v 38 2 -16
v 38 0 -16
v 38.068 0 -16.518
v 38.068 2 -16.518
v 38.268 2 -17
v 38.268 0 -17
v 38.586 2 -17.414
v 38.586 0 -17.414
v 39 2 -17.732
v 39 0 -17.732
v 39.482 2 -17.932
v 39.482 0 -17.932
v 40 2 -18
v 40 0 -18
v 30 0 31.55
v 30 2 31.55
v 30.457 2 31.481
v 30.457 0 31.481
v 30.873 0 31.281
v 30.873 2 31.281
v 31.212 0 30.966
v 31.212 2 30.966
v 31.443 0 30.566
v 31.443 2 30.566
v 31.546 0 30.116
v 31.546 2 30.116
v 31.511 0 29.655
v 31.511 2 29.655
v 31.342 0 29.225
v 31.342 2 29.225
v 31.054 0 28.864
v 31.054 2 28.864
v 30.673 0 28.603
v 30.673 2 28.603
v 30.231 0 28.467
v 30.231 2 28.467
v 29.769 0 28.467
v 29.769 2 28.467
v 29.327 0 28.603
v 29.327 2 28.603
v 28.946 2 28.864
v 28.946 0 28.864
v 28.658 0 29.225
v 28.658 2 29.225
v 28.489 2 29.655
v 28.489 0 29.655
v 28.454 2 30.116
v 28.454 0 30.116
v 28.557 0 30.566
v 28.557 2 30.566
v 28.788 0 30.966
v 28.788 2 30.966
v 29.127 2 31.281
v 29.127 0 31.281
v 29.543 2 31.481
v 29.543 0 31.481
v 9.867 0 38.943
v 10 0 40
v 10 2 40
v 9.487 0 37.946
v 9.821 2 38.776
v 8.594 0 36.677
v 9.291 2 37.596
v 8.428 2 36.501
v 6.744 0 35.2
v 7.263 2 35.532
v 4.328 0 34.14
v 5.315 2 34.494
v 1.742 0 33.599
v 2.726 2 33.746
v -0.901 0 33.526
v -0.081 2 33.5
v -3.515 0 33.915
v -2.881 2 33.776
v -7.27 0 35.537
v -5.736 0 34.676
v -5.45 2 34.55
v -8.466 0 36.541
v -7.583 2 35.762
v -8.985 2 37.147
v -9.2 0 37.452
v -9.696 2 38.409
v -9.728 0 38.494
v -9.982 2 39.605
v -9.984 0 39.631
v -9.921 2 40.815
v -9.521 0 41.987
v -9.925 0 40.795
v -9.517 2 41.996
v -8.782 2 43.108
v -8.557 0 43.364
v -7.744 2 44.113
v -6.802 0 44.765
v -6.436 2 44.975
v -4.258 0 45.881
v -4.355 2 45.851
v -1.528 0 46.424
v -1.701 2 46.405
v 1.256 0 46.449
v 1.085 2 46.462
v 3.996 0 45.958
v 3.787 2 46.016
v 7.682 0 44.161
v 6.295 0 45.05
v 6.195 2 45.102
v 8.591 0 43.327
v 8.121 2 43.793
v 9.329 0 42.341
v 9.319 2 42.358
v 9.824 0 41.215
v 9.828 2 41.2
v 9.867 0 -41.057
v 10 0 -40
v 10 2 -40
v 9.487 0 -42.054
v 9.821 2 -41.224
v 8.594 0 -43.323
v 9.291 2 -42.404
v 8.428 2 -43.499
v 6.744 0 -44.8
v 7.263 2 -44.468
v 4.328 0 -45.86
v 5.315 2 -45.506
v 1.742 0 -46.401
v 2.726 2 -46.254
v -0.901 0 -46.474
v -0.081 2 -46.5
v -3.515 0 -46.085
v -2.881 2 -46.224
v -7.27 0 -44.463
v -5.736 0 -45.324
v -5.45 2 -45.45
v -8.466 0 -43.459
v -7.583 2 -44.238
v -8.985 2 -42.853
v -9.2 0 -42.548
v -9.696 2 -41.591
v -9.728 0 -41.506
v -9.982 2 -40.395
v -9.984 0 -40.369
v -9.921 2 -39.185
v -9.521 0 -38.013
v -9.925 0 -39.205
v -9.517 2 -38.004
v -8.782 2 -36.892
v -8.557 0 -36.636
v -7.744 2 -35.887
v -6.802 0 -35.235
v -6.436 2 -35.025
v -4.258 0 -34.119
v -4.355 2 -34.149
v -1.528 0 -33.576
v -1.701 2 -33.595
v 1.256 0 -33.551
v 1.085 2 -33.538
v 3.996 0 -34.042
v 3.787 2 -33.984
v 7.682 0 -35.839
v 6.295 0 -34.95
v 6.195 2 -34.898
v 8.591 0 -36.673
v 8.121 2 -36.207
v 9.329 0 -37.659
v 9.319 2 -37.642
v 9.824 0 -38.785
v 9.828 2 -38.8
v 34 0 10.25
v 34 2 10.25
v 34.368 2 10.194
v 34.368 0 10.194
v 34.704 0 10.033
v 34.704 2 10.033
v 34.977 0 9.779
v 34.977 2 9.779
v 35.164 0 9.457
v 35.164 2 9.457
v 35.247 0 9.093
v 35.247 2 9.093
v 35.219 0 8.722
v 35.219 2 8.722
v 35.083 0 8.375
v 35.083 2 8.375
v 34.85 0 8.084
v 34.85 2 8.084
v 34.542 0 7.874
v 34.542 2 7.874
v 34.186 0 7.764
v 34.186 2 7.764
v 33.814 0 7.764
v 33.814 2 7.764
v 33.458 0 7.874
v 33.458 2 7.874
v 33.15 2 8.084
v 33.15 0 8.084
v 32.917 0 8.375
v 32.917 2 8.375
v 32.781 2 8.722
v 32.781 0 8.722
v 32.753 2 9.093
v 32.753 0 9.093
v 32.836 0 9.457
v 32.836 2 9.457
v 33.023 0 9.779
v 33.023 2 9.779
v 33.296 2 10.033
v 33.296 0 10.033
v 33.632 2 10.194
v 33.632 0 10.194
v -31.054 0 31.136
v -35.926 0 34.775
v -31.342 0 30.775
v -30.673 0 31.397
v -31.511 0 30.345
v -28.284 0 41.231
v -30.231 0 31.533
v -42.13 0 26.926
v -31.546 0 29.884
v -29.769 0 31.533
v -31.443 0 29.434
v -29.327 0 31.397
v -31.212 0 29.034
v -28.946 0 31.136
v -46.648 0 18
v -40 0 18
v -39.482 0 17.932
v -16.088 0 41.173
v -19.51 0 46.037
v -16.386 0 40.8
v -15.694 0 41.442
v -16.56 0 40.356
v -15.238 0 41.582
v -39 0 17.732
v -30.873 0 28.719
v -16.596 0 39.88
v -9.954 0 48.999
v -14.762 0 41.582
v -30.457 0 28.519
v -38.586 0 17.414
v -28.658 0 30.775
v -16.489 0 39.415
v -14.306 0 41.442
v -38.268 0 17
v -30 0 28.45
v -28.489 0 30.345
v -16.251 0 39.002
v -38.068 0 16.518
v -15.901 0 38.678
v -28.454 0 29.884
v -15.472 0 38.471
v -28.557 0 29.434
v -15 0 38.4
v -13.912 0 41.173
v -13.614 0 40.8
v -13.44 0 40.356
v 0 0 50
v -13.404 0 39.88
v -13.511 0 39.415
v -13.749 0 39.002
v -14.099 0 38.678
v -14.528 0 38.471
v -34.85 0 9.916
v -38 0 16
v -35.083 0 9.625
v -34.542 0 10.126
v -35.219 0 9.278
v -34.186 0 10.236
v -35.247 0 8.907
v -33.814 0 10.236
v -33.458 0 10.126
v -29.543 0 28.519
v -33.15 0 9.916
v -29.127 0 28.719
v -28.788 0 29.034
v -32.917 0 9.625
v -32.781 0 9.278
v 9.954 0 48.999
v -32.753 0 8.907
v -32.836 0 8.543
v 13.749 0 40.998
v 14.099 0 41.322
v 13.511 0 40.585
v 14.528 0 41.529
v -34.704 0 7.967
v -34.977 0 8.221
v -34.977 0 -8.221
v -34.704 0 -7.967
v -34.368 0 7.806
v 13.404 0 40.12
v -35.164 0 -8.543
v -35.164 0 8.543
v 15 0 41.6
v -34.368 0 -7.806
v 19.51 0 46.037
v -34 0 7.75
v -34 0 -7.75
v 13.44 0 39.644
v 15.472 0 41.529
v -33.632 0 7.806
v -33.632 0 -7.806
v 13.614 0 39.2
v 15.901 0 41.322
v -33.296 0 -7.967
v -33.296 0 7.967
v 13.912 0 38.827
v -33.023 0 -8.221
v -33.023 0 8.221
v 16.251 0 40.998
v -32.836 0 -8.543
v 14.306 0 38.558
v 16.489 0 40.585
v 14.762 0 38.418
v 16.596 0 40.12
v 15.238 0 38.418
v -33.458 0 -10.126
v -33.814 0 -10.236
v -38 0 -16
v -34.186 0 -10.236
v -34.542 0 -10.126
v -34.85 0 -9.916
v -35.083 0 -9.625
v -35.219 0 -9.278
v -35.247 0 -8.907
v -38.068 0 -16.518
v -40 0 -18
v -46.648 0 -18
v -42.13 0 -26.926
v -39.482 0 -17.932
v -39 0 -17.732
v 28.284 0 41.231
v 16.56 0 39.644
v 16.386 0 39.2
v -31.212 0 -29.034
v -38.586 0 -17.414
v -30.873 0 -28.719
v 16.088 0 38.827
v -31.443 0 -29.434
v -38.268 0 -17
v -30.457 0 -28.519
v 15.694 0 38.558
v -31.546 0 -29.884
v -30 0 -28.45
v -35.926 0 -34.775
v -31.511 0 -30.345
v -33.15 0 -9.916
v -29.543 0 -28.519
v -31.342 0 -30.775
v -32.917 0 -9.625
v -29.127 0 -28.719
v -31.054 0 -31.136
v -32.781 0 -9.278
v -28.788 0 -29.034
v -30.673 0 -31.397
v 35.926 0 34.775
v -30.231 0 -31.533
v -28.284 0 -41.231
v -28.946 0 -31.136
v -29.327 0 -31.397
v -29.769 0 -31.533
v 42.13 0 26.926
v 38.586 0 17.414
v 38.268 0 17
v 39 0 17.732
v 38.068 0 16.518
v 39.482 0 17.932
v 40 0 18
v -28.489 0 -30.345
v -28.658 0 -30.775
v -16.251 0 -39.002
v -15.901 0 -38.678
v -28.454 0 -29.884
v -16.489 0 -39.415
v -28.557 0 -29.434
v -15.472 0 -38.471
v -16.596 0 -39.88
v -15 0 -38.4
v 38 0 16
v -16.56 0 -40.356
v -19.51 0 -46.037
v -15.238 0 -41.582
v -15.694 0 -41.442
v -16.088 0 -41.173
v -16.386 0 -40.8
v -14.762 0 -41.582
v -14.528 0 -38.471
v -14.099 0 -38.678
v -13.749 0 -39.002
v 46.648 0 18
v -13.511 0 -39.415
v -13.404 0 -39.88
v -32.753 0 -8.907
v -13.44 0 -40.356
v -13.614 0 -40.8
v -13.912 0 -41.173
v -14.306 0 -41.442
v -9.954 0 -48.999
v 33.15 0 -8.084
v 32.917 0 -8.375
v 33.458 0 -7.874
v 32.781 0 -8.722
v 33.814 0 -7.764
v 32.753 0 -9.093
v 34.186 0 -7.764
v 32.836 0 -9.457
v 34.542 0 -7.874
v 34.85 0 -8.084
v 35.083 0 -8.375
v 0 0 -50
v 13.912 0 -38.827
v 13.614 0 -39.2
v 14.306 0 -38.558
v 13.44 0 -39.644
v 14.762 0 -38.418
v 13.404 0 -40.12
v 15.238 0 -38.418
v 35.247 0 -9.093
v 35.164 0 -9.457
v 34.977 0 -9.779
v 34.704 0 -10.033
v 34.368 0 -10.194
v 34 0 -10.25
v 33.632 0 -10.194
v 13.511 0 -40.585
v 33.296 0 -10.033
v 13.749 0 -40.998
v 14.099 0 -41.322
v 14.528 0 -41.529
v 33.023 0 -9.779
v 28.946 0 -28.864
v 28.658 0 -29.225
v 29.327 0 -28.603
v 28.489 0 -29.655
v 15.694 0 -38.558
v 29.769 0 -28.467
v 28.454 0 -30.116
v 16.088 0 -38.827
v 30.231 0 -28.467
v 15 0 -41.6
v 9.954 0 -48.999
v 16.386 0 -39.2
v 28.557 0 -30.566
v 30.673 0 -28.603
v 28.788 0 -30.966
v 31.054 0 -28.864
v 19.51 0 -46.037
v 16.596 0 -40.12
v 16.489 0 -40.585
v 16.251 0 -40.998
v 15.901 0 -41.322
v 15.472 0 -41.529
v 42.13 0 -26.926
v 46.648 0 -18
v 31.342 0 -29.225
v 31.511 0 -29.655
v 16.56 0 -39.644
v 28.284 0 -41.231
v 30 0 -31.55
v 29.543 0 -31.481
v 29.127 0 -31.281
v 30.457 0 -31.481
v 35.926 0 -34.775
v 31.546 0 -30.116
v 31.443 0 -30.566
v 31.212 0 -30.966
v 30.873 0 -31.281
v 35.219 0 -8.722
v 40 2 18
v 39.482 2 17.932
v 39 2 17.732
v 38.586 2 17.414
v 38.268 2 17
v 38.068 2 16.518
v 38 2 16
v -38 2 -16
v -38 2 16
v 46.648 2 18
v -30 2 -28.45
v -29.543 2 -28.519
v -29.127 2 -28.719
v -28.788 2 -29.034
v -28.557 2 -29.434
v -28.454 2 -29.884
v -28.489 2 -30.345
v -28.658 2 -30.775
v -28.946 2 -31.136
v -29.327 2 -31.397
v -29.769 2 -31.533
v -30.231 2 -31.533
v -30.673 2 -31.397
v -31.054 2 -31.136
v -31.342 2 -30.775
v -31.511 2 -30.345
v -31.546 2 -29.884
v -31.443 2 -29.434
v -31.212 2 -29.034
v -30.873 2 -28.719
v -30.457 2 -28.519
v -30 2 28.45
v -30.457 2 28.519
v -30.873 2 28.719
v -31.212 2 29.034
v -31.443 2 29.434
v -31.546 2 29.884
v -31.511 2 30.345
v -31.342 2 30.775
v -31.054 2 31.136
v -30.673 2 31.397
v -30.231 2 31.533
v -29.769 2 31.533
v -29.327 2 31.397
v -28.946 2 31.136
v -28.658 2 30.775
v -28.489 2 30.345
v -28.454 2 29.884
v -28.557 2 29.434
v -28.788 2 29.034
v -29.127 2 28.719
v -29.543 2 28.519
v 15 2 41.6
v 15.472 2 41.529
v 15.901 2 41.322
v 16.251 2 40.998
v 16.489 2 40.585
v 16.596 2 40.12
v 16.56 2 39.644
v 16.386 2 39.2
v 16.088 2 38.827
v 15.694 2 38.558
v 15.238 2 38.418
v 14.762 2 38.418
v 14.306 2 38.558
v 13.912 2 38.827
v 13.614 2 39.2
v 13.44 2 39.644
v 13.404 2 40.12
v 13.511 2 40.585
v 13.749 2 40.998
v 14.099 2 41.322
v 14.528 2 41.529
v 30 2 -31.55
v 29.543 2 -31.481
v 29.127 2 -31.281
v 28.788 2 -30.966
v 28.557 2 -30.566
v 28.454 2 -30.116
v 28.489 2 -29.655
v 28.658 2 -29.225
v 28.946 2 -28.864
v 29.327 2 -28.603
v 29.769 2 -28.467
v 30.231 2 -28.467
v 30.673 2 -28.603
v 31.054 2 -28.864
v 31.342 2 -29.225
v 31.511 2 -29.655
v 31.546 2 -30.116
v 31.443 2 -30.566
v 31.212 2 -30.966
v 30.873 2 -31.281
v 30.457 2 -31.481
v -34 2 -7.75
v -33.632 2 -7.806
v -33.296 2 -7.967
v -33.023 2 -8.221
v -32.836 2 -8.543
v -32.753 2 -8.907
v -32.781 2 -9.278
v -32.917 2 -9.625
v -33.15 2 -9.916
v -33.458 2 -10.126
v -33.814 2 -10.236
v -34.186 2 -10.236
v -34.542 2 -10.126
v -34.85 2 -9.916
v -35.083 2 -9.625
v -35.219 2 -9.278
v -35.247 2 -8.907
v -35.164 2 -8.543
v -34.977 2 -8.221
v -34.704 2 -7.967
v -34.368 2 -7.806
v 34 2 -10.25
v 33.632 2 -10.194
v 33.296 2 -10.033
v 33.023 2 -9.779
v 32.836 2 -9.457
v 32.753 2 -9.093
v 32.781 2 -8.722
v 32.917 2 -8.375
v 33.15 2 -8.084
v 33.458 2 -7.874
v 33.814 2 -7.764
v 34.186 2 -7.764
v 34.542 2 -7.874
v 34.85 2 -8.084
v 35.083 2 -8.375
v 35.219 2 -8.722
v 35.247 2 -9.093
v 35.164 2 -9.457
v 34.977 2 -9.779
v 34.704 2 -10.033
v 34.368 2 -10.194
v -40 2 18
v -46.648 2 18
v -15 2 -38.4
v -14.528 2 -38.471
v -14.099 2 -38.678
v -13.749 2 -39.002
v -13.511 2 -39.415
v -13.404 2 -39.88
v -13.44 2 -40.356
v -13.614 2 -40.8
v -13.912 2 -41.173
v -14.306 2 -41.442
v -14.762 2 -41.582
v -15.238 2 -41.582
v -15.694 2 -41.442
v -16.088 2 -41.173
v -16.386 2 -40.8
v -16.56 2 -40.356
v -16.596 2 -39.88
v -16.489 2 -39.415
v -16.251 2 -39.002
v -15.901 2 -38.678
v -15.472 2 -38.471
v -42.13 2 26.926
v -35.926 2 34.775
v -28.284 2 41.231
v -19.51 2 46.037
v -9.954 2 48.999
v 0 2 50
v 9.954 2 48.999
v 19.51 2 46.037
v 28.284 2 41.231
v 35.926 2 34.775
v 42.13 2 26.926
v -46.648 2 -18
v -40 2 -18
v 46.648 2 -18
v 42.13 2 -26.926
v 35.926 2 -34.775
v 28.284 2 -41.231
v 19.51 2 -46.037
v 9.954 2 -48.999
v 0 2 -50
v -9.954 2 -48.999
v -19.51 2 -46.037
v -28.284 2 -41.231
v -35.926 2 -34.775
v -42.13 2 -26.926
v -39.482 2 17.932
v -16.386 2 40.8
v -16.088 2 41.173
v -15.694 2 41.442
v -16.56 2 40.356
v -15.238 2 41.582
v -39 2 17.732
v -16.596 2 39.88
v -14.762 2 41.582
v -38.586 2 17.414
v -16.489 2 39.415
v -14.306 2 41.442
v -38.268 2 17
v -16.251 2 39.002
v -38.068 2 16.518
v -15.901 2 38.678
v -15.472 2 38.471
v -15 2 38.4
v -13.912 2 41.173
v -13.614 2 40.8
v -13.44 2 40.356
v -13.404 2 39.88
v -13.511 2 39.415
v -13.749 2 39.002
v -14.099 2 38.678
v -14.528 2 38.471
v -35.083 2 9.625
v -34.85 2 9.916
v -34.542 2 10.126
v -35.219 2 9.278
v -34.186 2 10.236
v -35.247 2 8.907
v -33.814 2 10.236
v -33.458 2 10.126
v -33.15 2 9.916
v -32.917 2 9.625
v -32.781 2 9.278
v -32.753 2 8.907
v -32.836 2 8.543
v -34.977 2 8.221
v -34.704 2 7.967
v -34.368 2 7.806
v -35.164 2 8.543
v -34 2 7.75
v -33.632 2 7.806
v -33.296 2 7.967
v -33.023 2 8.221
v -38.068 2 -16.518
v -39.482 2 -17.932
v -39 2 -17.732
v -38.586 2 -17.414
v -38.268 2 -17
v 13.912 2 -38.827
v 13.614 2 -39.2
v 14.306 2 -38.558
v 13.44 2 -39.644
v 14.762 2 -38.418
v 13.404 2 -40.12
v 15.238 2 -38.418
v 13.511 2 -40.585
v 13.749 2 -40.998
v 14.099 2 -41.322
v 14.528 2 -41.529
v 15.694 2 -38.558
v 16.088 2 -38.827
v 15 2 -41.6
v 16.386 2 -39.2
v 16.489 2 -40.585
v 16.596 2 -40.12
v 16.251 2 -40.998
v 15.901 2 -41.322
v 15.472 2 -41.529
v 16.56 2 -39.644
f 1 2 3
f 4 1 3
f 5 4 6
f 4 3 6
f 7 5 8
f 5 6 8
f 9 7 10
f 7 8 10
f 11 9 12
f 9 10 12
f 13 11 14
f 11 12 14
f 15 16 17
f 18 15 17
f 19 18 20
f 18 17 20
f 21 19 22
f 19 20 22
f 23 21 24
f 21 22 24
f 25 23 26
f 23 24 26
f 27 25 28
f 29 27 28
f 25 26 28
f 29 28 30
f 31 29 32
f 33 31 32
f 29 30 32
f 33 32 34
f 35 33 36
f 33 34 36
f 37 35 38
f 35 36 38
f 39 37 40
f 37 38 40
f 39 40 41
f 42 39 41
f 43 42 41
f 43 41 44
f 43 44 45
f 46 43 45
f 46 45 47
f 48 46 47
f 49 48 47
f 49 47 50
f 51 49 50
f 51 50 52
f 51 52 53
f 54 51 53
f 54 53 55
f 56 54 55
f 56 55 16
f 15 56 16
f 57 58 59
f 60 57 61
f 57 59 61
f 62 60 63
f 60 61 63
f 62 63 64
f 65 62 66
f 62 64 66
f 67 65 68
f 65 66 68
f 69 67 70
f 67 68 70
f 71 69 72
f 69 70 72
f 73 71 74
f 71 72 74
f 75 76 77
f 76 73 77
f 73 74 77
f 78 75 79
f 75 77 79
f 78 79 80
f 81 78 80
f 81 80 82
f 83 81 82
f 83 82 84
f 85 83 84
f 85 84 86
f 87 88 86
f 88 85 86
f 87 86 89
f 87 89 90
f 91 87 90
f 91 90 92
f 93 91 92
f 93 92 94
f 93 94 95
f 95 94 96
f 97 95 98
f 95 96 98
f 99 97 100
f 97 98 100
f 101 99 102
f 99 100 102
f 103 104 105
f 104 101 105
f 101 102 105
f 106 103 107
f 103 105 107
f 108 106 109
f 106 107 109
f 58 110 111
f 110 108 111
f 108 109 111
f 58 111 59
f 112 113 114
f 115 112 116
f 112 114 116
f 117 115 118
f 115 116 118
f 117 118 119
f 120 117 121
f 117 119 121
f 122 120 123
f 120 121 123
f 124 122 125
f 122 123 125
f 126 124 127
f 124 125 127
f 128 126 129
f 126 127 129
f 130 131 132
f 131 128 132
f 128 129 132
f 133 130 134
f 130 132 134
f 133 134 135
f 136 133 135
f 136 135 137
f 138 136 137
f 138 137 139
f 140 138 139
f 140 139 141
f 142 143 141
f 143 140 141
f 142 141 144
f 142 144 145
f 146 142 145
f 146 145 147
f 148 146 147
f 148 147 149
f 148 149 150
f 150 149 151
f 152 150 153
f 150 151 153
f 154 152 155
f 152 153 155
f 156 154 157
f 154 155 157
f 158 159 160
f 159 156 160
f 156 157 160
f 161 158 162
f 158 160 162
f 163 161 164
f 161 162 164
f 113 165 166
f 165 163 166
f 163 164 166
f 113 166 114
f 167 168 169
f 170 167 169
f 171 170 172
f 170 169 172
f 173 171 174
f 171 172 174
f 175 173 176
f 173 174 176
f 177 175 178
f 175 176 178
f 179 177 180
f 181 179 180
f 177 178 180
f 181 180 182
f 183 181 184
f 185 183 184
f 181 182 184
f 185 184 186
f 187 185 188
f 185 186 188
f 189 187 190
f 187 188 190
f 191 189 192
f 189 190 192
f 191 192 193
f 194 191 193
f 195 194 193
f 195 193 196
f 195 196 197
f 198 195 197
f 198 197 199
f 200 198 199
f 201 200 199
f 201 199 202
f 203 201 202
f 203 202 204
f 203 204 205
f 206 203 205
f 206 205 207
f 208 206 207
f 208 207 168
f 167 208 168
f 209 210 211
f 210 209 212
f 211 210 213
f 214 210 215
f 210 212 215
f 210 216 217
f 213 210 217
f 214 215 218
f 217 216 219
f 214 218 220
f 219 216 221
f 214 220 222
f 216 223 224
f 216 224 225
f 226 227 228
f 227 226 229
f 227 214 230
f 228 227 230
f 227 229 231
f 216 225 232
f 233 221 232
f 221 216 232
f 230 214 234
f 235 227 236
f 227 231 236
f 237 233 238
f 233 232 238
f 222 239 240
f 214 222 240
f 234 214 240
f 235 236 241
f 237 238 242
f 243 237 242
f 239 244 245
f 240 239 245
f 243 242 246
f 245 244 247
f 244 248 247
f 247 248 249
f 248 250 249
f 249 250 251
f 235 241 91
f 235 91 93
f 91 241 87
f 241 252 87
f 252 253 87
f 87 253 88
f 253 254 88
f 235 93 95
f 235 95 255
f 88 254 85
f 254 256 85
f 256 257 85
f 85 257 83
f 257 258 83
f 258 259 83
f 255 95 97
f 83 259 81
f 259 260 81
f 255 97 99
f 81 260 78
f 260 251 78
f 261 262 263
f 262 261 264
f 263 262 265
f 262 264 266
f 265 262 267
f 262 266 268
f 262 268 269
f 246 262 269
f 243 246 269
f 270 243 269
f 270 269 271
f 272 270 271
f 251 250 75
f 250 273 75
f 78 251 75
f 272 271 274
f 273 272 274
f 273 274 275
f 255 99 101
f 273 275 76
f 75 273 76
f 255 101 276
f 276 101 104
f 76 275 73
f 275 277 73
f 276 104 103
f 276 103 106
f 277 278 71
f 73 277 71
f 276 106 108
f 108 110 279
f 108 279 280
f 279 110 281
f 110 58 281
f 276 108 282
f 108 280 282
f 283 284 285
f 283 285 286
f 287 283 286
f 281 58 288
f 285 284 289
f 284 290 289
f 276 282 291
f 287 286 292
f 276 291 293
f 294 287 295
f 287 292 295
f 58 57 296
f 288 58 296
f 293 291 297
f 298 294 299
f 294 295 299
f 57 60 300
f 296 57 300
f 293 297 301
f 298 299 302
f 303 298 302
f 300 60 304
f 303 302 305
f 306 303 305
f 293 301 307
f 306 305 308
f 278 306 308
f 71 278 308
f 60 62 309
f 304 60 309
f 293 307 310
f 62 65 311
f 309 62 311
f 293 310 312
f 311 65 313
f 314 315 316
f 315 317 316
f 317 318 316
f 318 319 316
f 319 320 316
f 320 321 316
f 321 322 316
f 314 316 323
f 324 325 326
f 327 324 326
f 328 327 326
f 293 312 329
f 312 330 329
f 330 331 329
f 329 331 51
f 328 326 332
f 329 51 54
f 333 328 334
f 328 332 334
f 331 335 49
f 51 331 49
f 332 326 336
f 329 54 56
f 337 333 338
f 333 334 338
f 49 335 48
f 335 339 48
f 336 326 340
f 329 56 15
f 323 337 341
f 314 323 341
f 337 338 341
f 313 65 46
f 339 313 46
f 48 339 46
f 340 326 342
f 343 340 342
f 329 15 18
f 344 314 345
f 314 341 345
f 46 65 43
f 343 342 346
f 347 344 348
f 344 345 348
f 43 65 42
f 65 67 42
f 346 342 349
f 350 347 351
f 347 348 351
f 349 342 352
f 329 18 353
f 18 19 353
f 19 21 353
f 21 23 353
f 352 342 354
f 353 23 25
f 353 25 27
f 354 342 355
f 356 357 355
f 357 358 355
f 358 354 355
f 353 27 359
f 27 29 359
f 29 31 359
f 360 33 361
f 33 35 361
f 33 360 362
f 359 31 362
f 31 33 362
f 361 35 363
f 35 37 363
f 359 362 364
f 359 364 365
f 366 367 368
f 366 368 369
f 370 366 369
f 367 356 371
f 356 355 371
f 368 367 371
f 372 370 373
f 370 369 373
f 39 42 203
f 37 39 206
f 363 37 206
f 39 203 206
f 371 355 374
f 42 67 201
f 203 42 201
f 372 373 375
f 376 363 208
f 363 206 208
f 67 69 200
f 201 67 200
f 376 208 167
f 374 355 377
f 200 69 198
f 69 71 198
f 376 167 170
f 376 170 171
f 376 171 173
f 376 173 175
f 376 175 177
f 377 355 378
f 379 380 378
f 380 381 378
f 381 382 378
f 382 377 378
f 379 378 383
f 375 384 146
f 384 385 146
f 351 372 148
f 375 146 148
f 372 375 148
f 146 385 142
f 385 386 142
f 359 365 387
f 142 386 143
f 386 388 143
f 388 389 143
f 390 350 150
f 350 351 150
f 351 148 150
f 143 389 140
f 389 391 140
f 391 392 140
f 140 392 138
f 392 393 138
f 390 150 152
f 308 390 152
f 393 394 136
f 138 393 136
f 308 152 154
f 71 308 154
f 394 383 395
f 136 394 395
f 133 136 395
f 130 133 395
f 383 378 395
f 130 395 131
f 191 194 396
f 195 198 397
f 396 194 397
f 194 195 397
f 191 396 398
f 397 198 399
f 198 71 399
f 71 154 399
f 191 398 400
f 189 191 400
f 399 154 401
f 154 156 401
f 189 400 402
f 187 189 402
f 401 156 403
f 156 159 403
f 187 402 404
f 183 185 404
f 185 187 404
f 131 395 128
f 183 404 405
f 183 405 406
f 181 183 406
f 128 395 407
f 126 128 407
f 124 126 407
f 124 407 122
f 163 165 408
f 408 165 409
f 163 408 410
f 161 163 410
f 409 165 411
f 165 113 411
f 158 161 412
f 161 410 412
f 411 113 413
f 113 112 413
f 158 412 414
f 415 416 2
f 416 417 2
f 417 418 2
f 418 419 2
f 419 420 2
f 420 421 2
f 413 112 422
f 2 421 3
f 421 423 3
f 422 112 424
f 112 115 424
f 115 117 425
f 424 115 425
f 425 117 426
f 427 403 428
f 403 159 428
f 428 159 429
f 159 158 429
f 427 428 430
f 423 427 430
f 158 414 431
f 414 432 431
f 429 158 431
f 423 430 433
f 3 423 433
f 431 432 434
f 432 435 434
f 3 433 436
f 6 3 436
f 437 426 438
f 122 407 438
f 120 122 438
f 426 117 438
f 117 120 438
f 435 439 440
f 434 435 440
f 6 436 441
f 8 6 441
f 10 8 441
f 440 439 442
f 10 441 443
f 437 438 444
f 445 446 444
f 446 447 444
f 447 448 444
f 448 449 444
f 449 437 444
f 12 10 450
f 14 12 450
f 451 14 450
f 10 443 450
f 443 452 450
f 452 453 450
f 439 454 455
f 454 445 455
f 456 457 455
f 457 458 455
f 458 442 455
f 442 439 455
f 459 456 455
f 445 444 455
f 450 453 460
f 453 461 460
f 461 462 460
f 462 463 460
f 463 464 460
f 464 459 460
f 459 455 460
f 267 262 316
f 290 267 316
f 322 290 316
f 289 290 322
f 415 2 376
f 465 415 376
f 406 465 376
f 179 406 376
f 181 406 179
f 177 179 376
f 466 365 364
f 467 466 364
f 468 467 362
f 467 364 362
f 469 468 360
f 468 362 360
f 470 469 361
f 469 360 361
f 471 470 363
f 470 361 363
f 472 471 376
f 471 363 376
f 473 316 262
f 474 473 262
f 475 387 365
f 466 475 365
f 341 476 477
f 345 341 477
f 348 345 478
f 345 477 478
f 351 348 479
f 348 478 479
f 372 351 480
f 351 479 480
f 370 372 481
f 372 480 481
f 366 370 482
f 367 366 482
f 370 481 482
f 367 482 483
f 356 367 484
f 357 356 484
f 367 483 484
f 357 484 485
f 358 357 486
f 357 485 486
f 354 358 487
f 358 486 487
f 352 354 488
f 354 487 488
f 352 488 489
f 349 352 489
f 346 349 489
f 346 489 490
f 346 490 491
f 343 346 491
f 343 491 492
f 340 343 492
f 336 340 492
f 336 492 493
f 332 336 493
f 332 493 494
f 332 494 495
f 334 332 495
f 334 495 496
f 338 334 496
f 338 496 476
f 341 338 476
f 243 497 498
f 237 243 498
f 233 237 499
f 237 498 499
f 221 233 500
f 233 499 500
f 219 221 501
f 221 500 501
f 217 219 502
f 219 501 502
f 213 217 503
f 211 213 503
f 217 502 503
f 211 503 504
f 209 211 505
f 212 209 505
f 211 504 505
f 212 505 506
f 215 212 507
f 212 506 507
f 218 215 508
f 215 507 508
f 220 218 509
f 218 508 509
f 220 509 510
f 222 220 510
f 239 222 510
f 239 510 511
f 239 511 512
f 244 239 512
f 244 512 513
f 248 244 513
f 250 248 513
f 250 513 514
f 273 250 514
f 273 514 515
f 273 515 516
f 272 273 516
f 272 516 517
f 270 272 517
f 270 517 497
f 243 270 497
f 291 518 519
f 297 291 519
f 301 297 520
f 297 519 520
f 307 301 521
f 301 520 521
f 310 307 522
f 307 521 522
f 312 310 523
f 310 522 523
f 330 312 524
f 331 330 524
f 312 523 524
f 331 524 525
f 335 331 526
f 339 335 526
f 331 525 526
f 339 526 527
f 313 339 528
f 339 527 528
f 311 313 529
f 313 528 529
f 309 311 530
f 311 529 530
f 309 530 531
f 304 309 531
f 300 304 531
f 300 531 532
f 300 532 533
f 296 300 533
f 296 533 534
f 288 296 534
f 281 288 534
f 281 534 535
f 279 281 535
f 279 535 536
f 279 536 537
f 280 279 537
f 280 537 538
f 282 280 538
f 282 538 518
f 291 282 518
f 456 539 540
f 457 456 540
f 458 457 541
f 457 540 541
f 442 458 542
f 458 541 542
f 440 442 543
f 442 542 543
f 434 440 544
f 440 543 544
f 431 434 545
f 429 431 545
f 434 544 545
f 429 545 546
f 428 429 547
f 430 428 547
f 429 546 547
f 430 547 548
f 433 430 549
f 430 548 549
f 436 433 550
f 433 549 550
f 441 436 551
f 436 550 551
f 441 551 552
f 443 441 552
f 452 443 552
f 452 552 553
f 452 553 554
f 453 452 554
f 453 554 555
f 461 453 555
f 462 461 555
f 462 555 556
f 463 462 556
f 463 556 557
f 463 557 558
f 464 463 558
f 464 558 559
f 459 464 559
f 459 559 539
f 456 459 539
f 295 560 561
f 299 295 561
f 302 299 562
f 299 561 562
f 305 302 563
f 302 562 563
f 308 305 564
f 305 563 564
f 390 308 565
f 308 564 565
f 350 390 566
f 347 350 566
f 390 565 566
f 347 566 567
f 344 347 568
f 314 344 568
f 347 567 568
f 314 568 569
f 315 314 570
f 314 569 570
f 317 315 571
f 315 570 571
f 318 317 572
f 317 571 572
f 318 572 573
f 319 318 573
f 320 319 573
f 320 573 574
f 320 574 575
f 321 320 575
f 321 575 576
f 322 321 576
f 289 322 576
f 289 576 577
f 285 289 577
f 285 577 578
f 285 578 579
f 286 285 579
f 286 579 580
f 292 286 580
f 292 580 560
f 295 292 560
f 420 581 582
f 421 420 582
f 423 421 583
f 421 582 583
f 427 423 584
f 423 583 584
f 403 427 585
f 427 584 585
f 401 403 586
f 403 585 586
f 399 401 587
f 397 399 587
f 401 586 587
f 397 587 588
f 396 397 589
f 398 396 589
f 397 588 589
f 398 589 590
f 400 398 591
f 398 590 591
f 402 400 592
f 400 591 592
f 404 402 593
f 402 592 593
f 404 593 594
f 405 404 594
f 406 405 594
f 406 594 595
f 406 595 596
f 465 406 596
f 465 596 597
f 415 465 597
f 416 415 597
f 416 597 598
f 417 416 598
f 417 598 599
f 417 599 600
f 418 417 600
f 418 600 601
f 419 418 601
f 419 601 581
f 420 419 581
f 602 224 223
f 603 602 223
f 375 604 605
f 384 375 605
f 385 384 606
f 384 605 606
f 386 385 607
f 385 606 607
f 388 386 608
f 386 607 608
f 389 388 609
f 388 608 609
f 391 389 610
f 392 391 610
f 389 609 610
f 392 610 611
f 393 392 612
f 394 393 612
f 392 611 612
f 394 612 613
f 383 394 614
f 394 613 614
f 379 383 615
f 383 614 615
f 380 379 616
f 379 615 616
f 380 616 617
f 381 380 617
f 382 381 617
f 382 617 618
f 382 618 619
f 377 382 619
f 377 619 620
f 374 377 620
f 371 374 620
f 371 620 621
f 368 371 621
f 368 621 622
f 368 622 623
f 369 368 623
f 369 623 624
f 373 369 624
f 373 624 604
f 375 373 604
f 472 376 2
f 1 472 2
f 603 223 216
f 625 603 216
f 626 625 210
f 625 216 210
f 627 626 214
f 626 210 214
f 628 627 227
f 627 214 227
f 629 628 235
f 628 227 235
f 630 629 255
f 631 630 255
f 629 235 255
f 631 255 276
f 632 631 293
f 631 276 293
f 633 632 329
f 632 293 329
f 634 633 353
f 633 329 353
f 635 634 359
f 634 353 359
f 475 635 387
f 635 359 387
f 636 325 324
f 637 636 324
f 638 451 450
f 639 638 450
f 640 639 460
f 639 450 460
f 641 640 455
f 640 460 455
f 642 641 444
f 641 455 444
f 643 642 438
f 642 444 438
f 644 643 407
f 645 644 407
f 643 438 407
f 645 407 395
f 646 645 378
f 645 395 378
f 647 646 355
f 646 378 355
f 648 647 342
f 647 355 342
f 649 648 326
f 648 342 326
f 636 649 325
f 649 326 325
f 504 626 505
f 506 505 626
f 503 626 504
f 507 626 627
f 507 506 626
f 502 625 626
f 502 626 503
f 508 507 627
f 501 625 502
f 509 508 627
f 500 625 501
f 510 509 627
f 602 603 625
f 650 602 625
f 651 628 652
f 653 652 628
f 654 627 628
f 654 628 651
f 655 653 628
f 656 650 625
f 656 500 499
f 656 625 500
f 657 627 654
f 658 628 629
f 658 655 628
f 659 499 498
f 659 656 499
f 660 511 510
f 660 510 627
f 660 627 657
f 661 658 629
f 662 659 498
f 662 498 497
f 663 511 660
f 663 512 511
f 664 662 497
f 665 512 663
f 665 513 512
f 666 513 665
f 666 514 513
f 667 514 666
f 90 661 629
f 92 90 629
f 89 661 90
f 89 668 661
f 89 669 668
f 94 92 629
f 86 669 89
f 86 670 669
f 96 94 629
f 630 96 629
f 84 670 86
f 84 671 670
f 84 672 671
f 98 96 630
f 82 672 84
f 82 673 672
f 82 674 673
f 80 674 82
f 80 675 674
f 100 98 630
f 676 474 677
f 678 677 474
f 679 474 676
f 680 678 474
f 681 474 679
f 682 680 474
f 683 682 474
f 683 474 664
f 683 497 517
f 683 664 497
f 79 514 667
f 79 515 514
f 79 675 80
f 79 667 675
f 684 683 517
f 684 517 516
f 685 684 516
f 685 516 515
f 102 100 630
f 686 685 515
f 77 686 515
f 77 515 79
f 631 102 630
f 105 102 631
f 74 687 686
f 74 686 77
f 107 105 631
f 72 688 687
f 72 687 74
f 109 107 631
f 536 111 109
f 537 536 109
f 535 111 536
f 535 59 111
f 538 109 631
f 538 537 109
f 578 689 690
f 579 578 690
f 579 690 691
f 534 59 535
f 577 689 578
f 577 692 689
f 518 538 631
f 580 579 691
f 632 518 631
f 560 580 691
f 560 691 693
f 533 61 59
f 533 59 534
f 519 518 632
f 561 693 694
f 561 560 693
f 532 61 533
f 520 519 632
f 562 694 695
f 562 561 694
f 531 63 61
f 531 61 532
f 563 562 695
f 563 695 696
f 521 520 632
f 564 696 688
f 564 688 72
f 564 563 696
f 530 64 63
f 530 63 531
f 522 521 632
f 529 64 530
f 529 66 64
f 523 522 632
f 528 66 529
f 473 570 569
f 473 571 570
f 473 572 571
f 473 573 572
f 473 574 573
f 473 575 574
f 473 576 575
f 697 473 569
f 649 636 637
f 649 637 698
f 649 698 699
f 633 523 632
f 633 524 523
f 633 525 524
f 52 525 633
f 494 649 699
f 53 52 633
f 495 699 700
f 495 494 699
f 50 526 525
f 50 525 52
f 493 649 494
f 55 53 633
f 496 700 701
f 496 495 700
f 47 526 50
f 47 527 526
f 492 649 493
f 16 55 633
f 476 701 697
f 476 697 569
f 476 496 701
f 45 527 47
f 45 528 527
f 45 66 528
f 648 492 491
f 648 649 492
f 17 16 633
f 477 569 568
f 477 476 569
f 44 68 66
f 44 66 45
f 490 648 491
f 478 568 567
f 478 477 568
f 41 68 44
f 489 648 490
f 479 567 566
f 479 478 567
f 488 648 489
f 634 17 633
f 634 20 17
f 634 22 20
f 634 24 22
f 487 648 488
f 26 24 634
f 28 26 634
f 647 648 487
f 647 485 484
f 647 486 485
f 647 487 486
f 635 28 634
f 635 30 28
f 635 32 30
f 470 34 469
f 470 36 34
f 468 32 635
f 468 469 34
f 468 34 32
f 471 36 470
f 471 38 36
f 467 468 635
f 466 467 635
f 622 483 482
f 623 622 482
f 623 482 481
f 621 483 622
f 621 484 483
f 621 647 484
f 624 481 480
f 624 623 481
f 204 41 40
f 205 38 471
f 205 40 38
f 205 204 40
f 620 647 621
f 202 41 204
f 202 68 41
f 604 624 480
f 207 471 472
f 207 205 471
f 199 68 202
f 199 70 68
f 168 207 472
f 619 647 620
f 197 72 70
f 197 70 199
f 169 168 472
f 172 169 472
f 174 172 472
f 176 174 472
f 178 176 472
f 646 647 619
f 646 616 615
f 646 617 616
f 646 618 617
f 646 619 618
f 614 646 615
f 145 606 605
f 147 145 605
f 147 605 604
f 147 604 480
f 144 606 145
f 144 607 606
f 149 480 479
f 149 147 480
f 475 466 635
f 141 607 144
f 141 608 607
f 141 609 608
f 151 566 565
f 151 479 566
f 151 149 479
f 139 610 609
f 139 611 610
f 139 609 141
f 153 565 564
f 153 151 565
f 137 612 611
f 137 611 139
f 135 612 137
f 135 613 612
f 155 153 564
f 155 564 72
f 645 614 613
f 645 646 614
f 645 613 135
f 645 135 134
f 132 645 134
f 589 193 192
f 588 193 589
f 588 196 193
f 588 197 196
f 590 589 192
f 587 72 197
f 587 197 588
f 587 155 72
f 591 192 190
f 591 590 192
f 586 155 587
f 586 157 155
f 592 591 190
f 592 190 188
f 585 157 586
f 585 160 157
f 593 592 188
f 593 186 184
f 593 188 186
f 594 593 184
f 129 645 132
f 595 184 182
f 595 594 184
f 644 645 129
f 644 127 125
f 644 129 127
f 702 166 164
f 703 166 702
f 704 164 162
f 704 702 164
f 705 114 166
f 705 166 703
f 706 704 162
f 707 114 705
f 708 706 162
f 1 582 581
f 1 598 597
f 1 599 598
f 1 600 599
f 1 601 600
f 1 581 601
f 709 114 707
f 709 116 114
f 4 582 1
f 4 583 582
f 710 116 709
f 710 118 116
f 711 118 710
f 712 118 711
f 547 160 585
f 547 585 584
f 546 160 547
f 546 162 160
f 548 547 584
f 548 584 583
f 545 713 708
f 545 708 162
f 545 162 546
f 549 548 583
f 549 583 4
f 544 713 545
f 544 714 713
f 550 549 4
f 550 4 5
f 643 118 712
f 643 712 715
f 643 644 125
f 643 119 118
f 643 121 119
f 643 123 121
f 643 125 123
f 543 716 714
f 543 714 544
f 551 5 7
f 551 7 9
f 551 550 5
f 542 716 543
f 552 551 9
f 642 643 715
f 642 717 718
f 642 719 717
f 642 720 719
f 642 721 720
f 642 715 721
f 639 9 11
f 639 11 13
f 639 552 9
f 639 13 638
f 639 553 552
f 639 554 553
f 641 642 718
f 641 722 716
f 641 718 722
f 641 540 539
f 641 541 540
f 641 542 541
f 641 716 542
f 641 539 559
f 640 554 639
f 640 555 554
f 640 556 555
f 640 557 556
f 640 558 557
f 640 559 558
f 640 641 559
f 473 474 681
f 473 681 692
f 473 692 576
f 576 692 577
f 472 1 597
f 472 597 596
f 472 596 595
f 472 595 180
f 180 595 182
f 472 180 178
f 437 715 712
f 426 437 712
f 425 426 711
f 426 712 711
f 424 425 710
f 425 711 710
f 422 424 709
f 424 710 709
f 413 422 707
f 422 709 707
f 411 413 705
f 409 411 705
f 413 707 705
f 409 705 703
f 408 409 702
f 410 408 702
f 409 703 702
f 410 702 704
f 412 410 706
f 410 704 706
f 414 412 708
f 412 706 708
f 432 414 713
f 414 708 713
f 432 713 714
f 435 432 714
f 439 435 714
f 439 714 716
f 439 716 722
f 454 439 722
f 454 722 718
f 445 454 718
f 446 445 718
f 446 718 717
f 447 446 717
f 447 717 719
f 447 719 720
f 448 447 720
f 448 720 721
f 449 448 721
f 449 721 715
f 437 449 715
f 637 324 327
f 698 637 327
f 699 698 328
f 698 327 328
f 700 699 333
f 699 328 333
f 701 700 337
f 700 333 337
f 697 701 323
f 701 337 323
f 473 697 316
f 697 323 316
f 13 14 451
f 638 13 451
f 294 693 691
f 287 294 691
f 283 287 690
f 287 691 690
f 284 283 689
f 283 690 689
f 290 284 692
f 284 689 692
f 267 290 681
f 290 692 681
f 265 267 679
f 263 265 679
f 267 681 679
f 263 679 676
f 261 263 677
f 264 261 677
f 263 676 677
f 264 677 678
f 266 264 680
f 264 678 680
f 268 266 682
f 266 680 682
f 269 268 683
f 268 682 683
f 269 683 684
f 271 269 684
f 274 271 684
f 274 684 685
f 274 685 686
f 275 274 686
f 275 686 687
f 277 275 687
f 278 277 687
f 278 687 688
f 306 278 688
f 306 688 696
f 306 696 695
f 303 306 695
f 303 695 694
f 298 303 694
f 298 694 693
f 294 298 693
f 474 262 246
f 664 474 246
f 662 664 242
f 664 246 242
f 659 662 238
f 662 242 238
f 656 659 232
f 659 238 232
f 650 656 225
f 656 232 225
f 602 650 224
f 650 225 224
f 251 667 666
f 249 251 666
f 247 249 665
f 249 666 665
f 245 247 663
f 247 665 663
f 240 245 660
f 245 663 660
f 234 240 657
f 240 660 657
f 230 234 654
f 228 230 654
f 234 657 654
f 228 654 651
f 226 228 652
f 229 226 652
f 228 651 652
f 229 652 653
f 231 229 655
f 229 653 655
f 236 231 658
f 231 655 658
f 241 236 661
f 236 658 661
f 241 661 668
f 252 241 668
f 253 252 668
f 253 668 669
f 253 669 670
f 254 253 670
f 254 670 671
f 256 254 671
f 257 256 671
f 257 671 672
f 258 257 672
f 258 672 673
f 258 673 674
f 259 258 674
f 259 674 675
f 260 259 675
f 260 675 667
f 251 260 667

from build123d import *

# Parameters (mm, degrees)
BOSS_EXTRU_1_DEPTH      = 2
ESQUISSE2_RX            = 10
ESQUISSE2_RY            = 6.5
ENL_V_MAT_EXTRU_1_DEPTH = 69.410525506
ESQUISSE3_R             = 1.55
ESQUISSE3_R_2           = 1.6
ESQUISSE3_R_3           = 1.25
ENL_V_MAT_EXTRU_2_DEPTH = 10


with BuildPart() as part:
    # Esquisse1 → Boss.-Extru.1 (new body)
    with BuildSketch(Plane(origin=(0, 0, 0), x_dir=(1, 0, 0), z_dir=(0, 1, 0))):
        with BuildLine():
            Line((-46.647615159, 18), (-40, 18))
            ThreePointArc((-40, 18), (-38.585786438, 17.414213562), (-38, 16))
            Line((-38, 16), (-38, -16))
            ThreePointArc((-38, -16), (-38.585786438, -17.414213562), (-40, -18))
            Line((-40, -18), (-46.647615159, -18))
            ThreePointArc((-46.647615159, -18), (0, -50), (46.647615159, -18))
            Line((46.647615159, -18), (40, -18))
            ThreePointArc((40, -18), (38.585786438, -17.414213562), (38, -16))
            Line((38, -16), (38, 16))
            ThreePointArc((38, 16), (38.585786438, 17.414213562), (40, 18))
            Line((40, 18), (46.647615159, 18))
            ThreePointArc((46.647615159, 18), (0, 50), (-46.647615159, 18))
        make_face()
    extrude(amount=BOSS_EXTRU_1_DEPTH)

    # Esquisse2 → Enlèv. mat.-Extru.1 (cut, through all)
    with BuildSketch(Plane(origin=(0, 2, 0), x_dir=(1, 0, 0), z_dir=(0, 1, 0))):
        with Locations((0, 40)):
            Ellipse(ESQUISSE2_RX, ESQUISSE2_RY)
        with Locations((0, -40)):
            Ellipse(ESQUISSE2_RX, ESQUISSE2_RY)
    extrude(amount=-ENL_V_MAT_EXTRU_1_DEPTH, mode=Mode.SUBTRACT)

    # Esquisse3 → Enlèv. mat.-Extru.2 (cut)
    with BuildSketch(Plane(origin=(0, 2, 0), x_dir=(1, 0, 0), z_dir=(0, 1, 0))):
        with Locations(Location((-30, 30, 0), (0, 0, 270))):
            Circle(ESQUISSE3_R)
        with Locations(Location((30, 30, 0), (0, 0, 90))):
            Circle(ESQUISSE3_R)
        with Locations(Location((30, -30, 0), (0, 0, 270))):
            Circle(ESQUISSE3_R)
        with Locations(Location((-30, -30, 0), (0, 0, 90))):
            Circle(ESQUISSE3_R)
        with Locations(Location((-15, 40, 0), (0, 0, 270))):
            Circle(ESQUISSE3_R_2)
        with Locations(Location((15, 40, 0), (0, 0, 90))):
            Circle(ESQUISSE3_R_2)
        with Locations(Location((15, -40, 0), (0, 0, 270))):
            Circle(ESQUISSE3_R_2)
        with Locations(Location((-15, -40, 0), (0, 0, 90))):
            Circle(ESQUISSE3_R_2)
        with Locations(Location((-34, 9, 0), (0, 0, 270))):
            Circle(ESQUISSE3_R_3)
        with Locations(Location((-34, -9, 0), (0, 0, 90))):
            Circle(ESQUISSE3_R_3)
        with Locations(Location((34, -9, 0), (0, 0, 270))):
            Circle(ESQUISSE3_R_3)
        with Locations(Location((34, 9, 0), (0, 0, 90))):
            Circle(ESQUISSE3_R_3)
    extrude(amount=-ENL_V_MAT_EXTRU_2_DEPTH, mode=Mode.SUBTRACT)


solid = part.part
